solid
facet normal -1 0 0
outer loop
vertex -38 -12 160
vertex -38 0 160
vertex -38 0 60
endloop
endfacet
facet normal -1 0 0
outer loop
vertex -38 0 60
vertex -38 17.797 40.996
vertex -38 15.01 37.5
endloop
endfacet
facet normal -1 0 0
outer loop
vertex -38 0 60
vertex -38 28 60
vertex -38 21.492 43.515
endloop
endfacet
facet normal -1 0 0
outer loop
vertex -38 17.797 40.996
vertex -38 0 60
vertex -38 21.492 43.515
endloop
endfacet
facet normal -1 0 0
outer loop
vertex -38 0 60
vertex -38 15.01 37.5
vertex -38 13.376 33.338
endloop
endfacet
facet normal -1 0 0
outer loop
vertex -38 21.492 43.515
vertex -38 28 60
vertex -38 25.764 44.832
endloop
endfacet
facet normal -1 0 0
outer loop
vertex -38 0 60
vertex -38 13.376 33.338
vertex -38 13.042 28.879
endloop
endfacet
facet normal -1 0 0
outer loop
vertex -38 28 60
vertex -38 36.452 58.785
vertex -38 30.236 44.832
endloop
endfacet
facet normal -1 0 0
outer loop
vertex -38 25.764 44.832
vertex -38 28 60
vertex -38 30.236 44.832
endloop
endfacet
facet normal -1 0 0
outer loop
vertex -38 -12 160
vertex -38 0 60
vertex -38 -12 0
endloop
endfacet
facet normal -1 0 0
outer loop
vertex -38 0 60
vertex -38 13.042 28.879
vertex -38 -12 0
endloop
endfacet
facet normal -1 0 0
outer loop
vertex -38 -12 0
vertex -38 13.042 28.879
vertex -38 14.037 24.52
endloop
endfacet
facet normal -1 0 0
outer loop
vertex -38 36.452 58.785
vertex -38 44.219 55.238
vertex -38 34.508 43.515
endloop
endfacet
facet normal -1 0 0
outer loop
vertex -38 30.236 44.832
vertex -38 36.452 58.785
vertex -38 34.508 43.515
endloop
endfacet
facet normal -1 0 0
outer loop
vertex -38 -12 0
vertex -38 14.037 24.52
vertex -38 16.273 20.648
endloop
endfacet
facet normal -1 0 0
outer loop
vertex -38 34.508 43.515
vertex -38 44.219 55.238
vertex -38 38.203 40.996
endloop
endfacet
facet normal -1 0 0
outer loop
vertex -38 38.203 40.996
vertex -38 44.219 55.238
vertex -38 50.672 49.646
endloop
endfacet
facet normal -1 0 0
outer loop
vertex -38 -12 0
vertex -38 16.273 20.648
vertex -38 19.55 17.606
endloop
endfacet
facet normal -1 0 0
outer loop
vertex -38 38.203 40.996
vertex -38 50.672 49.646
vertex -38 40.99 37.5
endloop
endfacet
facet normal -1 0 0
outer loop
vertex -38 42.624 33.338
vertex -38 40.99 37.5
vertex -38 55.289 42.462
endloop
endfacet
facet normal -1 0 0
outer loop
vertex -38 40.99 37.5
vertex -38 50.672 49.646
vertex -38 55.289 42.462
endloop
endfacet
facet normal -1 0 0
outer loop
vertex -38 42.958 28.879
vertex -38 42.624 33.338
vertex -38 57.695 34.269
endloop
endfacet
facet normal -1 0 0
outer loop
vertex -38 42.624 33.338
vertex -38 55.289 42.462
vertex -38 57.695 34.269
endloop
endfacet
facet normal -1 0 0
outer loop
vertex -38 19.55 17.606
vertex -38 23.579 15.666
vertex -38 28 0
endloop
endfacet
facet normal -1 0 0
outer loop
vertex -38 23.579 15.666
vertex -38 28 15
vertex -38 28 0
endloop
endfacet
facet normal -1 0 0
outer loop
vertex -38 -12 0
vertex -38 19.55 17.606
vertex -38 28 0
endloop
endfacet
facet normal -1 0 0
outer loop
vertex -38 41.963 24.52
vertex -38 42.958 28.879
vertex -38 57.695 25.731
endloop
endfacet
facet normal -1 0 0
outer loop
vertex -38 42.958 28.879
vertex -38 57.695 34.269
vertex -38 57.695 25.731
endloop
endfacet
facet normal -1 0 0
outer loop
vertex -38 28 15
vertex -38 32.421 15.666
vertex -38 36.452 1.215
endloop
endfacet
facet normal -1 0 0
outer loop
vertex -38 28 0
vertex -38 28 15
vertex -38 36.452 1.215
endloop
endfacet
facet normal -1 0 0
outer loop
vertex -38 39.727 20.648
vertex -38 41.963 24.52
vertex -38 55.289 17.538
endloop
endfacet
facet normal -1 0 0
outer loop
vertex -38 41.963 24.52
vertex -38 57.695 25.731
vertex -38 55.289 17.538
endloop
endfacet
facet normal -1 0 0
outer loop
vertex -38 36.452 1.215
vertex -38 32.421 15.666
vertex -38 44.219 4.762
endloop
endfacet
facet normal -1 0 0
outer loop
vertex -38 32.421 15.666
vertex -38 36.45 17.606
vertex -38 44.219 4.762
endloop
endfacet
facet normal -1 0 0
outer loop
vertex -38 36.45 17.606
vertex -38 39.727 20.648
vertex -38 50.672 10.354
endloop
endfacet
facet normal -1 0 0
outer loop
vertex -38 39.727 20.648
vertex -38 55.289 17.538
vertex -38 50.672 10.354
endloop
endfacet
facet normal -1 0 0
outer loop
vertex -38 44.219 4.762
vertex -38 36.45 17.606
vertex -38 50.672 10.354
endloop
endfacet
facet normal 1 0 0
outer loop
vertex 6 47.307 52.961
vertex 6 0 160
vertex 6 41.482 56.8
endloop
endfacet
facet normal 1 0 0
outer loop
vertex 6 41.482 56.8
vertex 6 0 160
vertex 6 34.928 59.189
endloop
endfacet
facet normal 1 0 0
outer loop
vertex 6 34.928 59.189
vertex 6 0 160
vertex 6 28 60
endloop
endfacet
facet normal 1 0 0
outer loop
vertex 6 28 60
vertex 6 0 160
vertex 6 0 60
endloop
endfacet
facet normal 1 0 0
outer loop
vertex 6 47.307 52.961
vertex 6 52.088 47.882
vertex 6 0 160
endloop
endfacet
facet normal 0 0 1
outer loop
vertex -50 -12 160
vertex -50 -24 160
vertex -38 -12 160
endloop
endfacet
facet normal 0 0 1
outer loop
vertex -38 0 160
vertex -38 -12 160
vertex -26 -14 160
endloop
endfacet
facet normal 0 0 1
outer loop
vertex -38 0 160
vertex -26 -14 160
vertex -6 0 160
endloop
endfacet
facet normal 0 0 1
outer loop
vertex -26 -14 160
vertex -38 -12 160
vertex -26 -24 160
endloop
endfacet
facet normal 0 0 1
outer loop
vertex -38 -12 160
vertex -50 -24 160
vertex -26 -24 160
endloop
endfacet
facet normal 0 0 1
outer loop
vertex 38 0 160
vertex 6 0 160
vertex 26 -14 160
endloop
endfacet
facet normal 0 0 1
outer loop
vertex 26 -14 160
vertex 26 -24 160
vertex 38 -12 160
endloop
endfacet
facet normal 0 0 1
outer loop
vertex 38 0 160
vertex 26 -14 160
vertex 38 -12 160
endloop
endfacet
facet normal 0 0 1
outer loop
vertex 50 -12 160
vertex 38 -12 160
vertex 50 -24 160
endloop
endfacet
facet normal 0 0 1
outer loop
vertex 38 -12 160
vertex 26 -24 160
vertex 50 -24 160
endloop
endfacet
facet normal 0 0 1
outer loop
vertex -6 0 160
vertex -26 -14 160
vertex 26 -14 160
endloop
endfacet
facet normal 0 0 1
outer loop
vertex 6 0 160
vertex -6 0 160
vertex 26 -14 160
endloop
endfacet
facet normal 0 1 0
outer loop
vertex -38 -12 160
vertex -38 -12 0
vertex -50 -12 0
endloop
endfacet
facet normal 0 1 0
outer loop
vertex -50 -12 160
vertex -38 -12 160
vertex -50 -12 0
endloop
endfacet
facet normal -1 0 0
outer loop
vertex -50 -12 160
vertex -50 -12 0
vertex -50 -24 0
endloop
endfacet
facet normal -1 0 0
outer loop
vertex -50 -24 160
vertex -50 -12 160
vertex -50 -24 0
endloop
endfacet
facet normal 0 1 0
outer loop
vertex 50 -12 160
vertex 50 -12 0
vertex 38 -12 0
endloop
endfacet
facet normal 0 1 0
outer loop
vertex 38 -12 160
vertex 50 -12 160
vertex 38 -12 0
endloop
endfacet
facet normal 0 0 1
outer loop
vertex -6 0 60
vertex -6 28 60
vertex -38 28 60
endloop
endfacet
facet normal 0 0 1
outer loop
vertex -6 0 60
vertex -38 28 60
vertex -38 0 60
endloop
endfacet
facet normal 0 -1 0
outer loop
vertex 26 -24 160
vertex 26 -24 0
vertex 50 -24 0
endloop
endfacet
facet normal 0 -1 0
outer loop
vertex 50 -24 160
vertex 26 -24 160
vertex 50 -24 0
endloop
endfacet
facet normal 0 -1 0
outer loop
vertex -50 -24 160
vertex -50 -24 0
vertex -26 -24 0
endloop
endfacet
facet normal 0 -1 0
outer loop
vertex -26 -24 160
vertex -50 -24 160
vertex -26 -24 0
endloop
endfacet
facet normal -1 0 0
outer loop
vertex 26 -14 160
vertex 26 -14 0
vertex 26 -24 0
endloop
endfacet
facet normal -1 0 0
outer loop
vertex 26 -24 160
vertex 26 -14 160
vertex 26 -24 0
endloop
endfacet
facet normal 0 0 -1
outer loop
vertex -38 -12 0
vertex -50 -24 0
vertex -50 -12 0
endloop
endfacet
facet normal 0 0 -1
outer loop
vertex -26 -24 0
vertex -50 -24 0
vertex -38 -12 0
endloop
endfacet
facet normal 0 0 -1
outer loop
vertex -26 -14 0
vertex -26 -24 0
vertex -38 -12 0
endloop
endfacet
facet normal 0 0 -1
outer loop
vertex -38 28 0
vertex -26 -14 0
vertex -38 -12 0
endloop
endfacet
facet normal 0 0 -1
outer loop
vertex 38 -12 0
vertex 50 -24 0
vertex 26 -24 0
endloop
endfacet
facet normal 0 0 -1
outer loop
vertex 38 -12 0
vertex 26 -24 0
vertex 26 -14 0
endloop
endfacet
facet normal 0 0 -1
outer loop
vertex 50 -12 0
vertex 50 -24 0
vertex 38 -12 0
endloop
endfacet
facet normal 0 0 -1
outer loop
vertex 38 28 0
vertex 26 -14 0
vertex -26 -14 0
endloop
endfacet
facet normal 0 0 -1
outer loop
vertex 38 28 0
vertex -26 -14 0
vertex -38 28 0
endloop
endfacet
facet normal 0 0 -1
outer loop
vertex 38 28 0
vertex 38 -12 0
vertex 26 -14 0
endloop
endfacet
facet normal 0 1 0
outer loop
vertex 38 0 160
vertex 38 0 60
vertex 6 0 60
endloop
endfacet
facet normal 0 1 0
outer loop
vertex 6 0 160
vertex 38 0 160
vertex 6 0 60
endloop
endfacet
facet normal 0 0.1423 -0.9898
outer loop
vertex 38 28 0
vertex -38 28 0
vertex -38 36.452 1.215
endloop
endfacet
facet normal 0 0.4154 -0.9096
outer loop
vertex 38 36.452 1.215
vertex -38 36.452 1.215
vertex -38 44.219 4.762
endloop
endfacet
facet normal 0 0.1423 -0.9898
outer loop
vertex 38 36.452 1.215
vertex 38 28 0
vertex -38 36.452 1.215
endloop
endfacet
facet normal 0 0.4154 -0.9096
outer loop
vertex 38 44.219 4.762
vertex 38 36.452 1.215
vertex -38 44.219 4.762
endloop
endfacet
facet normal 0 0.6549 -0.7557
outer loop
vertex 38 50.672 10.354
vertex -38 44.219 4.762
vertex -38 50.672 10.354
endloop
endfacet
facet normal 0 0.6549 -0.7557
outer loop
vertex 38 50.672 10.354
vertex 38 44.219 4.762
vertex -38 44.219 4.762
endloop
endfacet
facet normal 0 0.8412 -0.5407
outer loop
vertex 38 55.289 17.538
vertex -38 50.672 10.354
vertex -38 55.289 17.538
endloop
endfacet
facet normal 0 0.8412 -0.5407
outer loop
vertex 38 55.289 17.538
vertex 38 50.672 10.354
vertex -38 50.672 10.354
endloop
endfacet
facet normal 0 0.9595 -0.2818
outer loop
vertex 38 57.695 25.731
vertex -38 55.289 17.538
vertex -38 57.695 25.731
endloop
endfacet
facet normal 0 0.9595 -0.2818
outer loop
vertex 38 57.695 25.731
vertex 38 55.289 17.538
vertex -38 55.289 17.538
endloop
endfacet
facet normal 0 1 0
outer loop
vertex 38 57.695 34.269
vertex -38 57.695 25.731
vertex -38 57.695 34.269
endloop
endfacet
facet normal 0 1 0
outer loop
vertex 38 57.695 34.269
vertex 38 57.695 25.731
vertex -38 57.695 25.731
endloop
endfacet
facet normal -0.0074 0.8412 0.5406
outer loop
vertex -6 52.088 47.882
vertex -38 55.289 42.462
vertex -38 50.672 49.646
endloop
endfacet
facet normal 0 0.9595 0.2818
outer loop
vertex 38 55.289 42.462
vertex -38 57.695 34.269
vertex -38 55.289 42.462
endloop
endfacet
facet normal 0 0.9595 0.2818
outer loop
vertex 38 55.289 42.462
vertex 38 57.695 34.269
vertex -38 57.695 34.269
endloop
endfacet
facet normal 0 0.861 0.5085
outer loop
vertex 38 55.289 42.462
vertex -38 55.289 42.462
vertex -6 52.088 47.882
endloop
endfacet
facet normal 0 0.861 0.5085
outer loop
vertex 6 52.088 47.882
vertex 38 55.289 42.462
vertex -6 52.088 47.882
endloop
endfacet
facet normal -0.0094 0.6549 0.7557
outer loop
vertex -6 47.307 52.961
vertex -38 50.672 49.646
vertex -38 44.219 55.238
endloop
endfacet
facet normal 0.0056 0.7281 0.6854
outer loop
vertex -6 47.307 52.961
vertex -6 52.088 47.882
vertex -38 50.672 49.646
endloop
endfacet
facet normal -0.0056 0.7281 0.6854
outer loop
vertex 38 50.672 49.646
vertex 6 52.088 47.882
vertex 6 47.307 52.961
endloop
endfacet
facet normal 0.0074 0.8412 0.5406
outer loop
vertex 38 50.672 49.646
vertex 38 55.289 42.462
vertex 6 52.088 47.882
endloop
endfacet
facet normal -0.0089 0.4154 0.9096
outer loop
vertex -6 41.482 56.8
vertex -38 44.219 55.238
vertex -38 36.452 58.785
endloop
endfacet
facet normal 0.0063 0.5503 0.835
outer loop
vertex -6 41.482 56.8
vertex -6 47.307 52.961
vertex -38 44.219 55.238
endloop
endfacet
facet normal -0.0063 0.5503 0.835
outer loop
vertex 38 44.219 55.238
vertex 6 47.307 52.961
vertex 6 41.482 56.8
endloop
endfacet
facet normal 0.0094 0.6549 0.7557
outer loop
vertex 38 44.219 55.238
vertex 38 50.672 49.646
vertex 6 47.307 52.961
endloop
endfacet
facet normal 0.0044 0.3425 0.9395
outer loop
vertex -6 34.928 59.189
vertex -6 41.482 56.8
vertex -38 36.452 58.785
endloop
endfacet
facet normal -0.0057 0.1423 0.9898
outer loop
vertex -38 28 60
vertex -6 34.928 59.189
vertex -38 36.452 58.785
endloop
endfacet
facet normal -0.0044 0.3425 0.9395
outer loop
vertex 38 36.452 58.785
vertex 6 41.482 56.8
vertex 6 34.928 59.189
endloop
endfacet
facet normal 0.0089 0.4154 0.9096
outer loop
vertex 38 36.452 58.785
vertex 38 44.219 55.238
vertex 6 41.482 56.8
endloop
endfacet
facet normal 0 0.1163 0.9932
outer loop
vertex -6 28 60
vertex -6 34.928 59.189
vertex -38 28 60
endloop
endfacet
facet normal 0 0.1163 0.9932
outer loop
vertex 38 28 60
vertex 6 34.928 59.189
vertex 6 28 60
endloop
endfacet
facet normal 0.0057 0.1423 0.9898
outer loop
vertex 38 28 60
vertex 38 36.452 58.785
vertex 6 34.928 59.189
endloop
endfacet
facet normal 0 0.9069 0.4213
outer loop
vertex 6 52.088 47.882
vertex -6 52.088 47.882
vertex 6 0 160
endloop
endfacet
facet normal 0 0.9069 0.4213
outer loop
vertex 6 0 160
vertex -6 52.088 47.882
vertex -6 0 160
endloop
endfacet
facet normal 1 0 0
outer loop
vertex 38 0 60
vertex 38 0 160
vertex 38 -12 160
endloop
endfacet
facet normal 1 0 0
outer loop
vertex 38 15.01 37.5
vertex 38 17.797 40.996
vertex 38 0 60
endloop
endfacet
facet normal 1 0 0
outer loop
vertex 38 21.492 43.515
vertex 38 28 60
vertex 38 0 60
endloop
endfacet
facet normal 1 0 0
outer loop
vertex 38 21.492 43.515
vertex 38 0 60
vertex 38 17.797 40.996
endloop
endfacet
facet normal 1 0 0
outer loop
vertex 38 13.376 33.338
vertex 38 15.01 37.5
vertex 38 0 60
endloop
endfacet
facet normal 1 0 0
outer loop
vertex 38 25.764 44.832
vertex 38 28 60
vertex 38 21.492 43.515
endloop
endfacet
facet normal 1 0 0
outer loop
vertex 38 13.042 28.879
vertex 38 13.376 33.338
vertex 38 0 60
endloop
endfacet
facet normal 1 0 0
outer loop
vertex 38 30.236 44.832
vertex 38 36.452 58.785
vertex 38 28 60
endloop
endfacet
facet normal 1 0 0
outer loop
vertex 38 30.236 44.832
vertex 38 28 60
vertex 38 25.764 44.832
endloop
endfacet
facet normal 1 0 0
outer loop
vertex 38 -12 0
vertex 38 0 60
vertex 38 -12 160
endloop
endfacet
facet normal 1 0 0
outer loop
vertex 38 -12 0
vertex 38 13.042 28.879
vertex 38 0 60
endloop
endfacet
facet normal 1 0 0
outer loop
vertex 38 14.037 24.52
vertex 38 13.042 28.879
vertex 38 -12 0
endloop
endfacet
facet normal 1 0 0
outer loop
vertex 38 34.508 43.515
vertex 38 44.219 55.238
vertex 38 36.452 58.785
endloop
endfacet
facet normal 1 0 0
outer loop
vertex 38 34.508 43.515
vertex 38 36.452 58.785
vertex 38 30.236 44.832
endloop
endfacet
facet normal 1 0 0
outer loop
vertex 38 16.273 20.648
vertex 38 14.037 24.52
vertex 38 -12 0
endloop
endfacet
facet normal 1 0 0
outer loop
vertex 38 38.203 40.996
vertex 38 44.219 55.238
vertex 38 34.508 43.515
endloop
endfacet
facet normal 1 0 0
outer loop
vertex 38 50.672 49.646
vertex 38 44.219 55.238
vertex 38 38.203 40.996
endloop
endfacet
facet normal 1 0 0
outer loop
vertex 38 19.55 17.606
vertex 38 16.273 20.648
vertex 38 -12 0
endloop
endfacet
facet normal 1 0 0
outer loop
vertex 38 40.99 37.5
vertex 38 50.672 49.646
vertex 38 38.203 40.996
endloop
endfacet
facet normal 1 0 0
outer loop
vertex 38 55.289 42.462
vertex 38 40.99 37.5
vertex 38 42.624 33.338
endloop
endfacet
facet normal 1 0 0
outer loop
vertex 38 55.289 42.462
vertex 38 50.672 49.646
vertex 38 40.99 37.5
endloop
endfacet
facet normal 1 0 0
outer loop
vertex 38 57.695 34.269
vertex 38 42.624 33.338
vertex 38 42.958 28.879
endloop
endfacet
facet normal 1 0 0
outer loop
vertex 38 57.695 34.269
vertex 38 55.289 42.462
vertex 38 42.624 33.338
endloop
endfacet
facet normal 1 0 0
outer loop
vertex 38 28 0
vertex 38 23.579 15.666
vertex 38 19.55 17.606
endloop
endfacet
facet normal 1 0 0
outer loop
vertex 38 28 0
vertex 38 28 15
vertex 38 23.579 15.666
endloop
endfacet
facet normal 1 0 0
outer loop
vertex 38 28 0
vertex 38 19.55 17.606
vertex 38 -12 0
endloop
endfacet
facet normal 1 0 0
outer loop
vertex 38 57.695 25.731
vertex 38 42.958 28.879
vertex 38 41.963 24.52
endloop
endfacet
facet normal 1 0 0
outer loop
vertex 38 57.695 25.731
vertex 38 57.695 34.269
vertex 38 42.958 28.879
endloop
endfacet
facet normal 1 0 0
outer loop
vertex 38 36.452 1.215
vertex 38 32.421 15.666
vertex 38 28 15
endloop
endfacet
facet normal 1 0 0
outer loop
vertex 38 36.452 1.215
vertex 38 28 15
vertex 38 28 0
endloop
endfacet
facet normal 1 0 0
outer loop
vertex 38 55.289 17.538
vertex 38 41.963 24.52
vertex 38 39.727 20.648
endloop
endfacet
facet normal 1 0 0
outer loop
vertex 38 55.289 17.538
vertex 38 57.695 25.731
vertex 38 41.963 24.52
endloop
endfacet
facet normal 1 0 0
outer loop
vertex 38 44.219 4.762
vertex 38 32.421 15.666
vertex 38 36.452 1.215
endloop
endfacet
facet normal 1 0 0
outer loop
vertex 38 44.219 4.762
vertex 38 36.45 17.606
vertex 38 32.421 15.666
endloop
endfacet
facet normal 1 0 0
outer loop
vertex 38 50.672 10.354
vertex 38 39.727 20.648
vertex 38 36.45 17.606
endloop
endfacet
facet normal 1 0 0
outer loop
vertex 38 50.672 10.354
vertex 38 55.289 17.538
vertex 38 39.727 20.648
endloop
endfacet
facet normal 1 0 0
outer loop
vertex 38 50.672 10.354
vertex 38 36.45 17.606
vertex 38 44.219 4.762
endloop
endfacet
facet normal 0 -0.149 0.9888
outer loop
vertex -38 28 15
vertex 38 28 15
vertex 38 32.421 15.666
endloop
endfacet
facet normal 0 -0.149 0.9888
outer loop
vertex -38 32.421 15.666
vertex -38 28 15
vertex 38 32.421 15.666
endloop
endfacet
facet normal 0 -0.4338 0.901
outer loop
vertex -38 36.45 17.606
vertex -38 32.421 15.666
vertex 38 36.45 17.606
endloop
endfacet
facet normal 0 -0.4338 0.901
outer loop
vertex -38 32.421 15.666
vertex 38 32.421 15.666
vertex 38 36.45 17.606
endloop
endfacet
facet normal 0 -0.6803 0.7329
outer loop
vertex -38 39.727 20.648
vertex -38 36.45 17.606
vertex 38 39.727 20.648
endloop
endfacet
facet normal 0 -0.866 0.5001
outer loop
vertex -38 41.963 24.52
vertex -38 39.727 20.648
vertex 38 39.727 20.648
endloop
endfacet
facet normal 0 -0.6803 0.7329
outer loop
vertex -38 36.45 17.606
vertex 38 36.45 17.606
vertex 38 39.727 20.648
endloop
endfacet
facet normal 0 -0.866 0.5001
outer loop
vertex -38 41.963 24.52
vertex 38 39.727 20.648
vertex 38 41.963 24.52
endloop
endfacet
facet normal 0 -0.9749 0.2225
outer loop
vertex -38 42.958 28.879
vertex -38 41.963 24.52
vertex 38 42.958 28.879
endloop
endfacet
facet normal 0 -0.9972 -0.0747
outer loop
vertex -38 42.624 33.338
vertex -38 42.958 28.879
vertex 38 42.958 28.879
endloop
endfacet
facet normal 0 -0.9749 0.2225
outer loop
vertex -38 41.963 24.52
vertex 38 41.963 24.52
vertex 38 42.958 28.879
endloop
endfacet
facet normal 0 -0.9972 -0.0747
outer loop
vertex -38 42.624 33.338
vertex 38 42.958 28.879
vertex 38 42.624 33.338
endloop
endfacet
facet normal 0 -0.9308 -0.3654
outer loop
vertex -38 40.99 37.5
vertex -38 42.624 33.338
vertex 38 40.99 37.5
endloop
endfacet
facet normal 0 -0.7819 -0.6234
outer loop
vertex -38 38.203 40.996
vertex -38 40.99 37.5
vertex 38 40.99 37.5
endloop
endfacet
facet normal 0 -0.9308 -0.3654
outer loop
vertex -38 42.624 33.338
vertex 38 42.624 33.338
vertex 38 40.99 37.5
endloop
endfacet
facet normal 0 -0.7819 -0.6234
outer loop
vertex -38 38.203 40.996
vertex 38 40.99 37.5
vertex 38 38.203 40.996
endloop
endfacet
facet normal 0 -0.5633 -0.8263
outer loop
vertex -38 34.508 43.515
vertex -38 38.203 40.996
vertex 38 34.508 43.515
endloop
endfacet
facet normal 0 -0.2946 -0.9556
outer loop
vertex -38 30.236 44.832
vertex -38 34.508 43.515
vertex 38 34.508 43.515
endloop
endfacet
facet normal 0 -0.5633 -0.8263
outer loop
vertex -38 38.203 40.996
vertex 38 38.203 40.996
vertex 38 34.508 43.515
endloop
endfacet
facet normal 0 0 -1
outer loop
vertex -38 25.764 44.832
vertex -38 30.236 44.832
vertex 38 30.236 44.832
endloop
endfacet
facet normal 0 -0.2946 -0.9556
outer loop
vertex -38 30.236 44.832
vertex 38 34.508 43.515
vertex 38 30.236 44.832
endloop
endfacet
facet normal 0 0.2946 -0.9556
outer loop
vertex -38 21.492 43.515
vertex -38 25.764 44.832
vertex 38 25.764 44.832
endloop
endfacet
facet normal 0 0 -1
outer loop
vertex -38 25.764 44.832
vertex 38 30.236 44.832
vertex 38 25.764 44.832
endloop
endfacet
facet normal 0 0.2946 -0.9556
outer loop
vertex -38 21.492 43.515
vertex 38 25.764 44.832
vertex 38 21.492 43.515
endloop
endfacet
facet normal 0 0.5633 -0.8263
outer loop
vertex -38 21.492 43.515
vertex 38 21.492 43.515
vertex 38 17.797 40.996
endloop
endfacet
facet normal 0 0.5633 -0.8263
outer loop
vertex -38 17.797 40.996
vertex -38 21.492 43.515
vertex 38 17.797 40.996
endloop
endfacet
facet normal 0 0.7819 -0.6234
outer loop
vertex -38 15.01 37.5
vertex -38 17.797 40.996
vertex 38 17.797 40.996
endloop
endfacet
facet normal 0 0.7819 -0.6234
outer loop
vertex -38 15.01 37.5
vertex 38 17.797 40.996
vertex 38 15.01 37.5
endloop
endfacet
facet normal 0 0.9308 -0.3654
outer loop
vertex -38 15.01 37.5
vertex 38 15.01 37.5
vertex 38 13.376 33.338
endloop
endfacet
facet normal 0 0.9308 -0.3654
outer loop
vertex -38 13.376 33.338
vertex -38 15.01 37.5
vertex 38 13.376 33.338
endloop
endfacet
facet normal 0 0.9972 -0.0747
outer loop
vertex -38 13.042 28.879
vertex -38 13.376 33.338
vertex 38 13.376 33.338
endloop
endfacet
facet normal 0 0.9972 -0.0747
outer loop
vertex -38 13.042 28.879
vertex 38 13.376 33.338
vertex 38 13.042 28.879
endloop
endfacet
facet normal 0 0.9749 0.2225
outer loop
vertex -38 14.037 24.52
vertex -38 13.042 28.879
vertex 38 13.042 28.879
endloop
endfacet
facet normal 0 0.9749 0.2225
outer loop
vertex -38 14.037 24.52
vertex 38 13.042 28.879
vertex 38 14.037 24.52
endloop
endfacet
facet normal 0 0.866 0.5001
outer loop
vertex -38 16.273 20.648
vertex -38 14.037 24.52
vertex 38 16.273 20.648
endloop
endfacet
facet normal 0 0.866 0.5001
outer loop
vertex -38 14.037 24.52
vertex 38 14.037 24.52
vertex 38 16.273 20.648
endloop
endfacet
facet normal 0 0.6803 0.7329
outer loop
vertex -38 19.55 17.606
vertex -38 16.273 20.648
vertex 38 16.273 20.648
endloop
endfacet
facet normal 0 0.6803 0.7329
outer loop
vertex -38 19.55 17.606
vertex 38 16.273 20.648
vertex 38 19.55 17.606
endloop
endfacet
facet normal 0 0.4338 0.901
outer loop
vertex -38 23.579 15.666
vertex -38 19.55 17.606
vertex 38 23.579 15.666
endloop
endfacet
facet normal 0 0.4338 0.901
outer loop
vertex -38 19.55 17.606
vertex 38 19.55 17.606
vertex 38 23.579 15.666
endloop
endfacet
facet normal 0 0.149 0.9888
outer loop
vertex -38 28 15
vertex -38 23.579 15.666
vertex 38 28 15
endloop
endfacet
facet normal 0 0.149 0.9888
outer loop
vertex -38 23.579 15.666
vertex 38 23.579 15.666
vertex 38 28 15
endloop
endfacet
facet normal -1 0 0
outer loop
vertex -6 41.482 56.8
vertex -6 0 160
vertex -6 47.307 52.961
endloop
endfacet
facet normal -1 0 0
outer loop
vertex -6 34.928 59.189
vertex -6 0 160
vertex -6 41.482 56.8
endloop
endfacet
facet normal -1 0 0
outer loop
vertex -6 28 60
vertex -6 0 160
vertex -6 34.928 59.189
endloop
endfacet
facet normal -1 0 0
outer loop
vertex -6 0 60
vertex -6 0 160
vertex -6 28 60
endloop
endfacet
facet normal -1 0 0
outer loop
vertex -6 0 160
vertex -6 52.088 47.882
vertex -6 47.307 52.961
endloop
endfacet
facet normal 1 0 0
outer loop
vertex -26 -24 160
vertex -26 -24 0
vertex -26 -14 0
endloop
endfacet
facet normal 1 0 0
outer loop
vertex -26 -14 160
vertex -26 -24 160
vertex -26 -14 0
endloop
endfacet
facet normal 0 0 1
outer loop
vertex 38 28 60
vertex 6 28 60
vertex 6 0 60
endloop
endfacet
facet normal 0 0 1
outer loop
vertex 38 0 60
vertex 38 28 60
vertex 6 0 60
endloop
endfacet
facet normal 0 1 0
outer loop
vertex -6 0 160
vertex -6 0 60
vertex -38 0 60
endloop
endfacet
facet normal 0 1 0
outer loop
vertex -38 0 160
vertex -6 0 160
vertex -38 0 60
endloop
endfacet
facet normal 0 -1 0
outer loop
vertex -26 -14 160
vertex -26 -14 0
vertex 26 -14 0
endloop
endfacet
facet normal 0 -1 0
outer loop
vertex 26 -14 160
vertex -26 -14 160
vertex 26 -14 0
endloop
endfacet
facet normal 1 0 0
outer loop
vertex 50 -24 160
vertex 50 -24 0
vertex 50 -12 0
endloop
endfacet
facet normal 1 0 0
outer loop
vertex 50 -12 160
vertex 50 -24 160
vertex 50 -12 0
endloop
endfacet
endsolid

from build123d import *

# Parameters (mm, degrees)
BOSS_EXTRUDE1_DEPTH     = 160
SKETCH2_R               = 15
BOSS_EXTRUDE9_DEPTH     = 76
SKETCH6_W               = 12
SKETCH6_H               = 112.118263274
BOSS_EXTRUDE10_DEPTH    = 72
CUT_EXTRUDE6_DEPTH      = 183.439030912
CUT_EXTRUDE6_DEPTH_BACK = 183.439030912


with BuildPart() as part:
    # Sketch1 → Boss-Extrude1 (new body)
    with BuildSketch(Plane.XY):
        Polygon((0, 0), (-38, 0), (-38, -12), (-50, -12), (-50, -24), (-26, -24), (-26, -14), (26, -14), (26, -24), (50, -24), (50, -12), (38, -12), (38, 0), align=None)
    extrude(amount=BOSS_EXTRUDE1_DEPTH)

    # Sketch2 → Boss-Extrude9 (add)
    with BuildSketch(Plane(origin=(38, 0, 0), x_dir=(0, 0, -1), z_dir=(1, 0, 0))):
        with BuildLine():
            Line((-60, 0), (0, 0))
            Line((0, 0), (0, 28))
            ThreePointArc((0, 28), (-30, 58), (-60, 28))
            Line((-60, 28), (-60, 0))
        make_face()
        with Locations((-30, 28)):
            Circle(SKETCH2_R, mode=Mode.SUBTRACT)
    extrude(amount=-BOSS_EXTRUDE9_DEPTH)

    # Sketch6 → Boss-Extrude10 (add)
    with BuildSketch(Plane(origin=(0, 0, 0), x_dir=(1, 0, 0), z_dir=(0, 1, 0))):
        with Locations((0, -103.940868363)):
            Rectangle(SKETCH6_W, SKETCH6_H)
    extrude(amount=BOSS_EXTRUDE10_DEPTH)

    # Sketch7 → Cut-Extrude6 (cut, two sides: drawn at the far end of the back side and taken through both)
    with BuildSketch(Plane(origin=(0, 0, 0), x_dir=(0, 0, -1), z_dir=(1, 0, 0)).offset(-CUT_EXTRUDE6_DEPTH_BACK)):
        Polygon((-47.881736726, 52.088243848), (-160, 0), (-160, 72), (-47.881736726, 72), align=None)
    extrude(amount=CUT_EXTRUDE6_DEPTH + CUT_EXTRUDE6_DEPTH_BACK, mode=Mode.SUBTRACT)


solid = part.part
